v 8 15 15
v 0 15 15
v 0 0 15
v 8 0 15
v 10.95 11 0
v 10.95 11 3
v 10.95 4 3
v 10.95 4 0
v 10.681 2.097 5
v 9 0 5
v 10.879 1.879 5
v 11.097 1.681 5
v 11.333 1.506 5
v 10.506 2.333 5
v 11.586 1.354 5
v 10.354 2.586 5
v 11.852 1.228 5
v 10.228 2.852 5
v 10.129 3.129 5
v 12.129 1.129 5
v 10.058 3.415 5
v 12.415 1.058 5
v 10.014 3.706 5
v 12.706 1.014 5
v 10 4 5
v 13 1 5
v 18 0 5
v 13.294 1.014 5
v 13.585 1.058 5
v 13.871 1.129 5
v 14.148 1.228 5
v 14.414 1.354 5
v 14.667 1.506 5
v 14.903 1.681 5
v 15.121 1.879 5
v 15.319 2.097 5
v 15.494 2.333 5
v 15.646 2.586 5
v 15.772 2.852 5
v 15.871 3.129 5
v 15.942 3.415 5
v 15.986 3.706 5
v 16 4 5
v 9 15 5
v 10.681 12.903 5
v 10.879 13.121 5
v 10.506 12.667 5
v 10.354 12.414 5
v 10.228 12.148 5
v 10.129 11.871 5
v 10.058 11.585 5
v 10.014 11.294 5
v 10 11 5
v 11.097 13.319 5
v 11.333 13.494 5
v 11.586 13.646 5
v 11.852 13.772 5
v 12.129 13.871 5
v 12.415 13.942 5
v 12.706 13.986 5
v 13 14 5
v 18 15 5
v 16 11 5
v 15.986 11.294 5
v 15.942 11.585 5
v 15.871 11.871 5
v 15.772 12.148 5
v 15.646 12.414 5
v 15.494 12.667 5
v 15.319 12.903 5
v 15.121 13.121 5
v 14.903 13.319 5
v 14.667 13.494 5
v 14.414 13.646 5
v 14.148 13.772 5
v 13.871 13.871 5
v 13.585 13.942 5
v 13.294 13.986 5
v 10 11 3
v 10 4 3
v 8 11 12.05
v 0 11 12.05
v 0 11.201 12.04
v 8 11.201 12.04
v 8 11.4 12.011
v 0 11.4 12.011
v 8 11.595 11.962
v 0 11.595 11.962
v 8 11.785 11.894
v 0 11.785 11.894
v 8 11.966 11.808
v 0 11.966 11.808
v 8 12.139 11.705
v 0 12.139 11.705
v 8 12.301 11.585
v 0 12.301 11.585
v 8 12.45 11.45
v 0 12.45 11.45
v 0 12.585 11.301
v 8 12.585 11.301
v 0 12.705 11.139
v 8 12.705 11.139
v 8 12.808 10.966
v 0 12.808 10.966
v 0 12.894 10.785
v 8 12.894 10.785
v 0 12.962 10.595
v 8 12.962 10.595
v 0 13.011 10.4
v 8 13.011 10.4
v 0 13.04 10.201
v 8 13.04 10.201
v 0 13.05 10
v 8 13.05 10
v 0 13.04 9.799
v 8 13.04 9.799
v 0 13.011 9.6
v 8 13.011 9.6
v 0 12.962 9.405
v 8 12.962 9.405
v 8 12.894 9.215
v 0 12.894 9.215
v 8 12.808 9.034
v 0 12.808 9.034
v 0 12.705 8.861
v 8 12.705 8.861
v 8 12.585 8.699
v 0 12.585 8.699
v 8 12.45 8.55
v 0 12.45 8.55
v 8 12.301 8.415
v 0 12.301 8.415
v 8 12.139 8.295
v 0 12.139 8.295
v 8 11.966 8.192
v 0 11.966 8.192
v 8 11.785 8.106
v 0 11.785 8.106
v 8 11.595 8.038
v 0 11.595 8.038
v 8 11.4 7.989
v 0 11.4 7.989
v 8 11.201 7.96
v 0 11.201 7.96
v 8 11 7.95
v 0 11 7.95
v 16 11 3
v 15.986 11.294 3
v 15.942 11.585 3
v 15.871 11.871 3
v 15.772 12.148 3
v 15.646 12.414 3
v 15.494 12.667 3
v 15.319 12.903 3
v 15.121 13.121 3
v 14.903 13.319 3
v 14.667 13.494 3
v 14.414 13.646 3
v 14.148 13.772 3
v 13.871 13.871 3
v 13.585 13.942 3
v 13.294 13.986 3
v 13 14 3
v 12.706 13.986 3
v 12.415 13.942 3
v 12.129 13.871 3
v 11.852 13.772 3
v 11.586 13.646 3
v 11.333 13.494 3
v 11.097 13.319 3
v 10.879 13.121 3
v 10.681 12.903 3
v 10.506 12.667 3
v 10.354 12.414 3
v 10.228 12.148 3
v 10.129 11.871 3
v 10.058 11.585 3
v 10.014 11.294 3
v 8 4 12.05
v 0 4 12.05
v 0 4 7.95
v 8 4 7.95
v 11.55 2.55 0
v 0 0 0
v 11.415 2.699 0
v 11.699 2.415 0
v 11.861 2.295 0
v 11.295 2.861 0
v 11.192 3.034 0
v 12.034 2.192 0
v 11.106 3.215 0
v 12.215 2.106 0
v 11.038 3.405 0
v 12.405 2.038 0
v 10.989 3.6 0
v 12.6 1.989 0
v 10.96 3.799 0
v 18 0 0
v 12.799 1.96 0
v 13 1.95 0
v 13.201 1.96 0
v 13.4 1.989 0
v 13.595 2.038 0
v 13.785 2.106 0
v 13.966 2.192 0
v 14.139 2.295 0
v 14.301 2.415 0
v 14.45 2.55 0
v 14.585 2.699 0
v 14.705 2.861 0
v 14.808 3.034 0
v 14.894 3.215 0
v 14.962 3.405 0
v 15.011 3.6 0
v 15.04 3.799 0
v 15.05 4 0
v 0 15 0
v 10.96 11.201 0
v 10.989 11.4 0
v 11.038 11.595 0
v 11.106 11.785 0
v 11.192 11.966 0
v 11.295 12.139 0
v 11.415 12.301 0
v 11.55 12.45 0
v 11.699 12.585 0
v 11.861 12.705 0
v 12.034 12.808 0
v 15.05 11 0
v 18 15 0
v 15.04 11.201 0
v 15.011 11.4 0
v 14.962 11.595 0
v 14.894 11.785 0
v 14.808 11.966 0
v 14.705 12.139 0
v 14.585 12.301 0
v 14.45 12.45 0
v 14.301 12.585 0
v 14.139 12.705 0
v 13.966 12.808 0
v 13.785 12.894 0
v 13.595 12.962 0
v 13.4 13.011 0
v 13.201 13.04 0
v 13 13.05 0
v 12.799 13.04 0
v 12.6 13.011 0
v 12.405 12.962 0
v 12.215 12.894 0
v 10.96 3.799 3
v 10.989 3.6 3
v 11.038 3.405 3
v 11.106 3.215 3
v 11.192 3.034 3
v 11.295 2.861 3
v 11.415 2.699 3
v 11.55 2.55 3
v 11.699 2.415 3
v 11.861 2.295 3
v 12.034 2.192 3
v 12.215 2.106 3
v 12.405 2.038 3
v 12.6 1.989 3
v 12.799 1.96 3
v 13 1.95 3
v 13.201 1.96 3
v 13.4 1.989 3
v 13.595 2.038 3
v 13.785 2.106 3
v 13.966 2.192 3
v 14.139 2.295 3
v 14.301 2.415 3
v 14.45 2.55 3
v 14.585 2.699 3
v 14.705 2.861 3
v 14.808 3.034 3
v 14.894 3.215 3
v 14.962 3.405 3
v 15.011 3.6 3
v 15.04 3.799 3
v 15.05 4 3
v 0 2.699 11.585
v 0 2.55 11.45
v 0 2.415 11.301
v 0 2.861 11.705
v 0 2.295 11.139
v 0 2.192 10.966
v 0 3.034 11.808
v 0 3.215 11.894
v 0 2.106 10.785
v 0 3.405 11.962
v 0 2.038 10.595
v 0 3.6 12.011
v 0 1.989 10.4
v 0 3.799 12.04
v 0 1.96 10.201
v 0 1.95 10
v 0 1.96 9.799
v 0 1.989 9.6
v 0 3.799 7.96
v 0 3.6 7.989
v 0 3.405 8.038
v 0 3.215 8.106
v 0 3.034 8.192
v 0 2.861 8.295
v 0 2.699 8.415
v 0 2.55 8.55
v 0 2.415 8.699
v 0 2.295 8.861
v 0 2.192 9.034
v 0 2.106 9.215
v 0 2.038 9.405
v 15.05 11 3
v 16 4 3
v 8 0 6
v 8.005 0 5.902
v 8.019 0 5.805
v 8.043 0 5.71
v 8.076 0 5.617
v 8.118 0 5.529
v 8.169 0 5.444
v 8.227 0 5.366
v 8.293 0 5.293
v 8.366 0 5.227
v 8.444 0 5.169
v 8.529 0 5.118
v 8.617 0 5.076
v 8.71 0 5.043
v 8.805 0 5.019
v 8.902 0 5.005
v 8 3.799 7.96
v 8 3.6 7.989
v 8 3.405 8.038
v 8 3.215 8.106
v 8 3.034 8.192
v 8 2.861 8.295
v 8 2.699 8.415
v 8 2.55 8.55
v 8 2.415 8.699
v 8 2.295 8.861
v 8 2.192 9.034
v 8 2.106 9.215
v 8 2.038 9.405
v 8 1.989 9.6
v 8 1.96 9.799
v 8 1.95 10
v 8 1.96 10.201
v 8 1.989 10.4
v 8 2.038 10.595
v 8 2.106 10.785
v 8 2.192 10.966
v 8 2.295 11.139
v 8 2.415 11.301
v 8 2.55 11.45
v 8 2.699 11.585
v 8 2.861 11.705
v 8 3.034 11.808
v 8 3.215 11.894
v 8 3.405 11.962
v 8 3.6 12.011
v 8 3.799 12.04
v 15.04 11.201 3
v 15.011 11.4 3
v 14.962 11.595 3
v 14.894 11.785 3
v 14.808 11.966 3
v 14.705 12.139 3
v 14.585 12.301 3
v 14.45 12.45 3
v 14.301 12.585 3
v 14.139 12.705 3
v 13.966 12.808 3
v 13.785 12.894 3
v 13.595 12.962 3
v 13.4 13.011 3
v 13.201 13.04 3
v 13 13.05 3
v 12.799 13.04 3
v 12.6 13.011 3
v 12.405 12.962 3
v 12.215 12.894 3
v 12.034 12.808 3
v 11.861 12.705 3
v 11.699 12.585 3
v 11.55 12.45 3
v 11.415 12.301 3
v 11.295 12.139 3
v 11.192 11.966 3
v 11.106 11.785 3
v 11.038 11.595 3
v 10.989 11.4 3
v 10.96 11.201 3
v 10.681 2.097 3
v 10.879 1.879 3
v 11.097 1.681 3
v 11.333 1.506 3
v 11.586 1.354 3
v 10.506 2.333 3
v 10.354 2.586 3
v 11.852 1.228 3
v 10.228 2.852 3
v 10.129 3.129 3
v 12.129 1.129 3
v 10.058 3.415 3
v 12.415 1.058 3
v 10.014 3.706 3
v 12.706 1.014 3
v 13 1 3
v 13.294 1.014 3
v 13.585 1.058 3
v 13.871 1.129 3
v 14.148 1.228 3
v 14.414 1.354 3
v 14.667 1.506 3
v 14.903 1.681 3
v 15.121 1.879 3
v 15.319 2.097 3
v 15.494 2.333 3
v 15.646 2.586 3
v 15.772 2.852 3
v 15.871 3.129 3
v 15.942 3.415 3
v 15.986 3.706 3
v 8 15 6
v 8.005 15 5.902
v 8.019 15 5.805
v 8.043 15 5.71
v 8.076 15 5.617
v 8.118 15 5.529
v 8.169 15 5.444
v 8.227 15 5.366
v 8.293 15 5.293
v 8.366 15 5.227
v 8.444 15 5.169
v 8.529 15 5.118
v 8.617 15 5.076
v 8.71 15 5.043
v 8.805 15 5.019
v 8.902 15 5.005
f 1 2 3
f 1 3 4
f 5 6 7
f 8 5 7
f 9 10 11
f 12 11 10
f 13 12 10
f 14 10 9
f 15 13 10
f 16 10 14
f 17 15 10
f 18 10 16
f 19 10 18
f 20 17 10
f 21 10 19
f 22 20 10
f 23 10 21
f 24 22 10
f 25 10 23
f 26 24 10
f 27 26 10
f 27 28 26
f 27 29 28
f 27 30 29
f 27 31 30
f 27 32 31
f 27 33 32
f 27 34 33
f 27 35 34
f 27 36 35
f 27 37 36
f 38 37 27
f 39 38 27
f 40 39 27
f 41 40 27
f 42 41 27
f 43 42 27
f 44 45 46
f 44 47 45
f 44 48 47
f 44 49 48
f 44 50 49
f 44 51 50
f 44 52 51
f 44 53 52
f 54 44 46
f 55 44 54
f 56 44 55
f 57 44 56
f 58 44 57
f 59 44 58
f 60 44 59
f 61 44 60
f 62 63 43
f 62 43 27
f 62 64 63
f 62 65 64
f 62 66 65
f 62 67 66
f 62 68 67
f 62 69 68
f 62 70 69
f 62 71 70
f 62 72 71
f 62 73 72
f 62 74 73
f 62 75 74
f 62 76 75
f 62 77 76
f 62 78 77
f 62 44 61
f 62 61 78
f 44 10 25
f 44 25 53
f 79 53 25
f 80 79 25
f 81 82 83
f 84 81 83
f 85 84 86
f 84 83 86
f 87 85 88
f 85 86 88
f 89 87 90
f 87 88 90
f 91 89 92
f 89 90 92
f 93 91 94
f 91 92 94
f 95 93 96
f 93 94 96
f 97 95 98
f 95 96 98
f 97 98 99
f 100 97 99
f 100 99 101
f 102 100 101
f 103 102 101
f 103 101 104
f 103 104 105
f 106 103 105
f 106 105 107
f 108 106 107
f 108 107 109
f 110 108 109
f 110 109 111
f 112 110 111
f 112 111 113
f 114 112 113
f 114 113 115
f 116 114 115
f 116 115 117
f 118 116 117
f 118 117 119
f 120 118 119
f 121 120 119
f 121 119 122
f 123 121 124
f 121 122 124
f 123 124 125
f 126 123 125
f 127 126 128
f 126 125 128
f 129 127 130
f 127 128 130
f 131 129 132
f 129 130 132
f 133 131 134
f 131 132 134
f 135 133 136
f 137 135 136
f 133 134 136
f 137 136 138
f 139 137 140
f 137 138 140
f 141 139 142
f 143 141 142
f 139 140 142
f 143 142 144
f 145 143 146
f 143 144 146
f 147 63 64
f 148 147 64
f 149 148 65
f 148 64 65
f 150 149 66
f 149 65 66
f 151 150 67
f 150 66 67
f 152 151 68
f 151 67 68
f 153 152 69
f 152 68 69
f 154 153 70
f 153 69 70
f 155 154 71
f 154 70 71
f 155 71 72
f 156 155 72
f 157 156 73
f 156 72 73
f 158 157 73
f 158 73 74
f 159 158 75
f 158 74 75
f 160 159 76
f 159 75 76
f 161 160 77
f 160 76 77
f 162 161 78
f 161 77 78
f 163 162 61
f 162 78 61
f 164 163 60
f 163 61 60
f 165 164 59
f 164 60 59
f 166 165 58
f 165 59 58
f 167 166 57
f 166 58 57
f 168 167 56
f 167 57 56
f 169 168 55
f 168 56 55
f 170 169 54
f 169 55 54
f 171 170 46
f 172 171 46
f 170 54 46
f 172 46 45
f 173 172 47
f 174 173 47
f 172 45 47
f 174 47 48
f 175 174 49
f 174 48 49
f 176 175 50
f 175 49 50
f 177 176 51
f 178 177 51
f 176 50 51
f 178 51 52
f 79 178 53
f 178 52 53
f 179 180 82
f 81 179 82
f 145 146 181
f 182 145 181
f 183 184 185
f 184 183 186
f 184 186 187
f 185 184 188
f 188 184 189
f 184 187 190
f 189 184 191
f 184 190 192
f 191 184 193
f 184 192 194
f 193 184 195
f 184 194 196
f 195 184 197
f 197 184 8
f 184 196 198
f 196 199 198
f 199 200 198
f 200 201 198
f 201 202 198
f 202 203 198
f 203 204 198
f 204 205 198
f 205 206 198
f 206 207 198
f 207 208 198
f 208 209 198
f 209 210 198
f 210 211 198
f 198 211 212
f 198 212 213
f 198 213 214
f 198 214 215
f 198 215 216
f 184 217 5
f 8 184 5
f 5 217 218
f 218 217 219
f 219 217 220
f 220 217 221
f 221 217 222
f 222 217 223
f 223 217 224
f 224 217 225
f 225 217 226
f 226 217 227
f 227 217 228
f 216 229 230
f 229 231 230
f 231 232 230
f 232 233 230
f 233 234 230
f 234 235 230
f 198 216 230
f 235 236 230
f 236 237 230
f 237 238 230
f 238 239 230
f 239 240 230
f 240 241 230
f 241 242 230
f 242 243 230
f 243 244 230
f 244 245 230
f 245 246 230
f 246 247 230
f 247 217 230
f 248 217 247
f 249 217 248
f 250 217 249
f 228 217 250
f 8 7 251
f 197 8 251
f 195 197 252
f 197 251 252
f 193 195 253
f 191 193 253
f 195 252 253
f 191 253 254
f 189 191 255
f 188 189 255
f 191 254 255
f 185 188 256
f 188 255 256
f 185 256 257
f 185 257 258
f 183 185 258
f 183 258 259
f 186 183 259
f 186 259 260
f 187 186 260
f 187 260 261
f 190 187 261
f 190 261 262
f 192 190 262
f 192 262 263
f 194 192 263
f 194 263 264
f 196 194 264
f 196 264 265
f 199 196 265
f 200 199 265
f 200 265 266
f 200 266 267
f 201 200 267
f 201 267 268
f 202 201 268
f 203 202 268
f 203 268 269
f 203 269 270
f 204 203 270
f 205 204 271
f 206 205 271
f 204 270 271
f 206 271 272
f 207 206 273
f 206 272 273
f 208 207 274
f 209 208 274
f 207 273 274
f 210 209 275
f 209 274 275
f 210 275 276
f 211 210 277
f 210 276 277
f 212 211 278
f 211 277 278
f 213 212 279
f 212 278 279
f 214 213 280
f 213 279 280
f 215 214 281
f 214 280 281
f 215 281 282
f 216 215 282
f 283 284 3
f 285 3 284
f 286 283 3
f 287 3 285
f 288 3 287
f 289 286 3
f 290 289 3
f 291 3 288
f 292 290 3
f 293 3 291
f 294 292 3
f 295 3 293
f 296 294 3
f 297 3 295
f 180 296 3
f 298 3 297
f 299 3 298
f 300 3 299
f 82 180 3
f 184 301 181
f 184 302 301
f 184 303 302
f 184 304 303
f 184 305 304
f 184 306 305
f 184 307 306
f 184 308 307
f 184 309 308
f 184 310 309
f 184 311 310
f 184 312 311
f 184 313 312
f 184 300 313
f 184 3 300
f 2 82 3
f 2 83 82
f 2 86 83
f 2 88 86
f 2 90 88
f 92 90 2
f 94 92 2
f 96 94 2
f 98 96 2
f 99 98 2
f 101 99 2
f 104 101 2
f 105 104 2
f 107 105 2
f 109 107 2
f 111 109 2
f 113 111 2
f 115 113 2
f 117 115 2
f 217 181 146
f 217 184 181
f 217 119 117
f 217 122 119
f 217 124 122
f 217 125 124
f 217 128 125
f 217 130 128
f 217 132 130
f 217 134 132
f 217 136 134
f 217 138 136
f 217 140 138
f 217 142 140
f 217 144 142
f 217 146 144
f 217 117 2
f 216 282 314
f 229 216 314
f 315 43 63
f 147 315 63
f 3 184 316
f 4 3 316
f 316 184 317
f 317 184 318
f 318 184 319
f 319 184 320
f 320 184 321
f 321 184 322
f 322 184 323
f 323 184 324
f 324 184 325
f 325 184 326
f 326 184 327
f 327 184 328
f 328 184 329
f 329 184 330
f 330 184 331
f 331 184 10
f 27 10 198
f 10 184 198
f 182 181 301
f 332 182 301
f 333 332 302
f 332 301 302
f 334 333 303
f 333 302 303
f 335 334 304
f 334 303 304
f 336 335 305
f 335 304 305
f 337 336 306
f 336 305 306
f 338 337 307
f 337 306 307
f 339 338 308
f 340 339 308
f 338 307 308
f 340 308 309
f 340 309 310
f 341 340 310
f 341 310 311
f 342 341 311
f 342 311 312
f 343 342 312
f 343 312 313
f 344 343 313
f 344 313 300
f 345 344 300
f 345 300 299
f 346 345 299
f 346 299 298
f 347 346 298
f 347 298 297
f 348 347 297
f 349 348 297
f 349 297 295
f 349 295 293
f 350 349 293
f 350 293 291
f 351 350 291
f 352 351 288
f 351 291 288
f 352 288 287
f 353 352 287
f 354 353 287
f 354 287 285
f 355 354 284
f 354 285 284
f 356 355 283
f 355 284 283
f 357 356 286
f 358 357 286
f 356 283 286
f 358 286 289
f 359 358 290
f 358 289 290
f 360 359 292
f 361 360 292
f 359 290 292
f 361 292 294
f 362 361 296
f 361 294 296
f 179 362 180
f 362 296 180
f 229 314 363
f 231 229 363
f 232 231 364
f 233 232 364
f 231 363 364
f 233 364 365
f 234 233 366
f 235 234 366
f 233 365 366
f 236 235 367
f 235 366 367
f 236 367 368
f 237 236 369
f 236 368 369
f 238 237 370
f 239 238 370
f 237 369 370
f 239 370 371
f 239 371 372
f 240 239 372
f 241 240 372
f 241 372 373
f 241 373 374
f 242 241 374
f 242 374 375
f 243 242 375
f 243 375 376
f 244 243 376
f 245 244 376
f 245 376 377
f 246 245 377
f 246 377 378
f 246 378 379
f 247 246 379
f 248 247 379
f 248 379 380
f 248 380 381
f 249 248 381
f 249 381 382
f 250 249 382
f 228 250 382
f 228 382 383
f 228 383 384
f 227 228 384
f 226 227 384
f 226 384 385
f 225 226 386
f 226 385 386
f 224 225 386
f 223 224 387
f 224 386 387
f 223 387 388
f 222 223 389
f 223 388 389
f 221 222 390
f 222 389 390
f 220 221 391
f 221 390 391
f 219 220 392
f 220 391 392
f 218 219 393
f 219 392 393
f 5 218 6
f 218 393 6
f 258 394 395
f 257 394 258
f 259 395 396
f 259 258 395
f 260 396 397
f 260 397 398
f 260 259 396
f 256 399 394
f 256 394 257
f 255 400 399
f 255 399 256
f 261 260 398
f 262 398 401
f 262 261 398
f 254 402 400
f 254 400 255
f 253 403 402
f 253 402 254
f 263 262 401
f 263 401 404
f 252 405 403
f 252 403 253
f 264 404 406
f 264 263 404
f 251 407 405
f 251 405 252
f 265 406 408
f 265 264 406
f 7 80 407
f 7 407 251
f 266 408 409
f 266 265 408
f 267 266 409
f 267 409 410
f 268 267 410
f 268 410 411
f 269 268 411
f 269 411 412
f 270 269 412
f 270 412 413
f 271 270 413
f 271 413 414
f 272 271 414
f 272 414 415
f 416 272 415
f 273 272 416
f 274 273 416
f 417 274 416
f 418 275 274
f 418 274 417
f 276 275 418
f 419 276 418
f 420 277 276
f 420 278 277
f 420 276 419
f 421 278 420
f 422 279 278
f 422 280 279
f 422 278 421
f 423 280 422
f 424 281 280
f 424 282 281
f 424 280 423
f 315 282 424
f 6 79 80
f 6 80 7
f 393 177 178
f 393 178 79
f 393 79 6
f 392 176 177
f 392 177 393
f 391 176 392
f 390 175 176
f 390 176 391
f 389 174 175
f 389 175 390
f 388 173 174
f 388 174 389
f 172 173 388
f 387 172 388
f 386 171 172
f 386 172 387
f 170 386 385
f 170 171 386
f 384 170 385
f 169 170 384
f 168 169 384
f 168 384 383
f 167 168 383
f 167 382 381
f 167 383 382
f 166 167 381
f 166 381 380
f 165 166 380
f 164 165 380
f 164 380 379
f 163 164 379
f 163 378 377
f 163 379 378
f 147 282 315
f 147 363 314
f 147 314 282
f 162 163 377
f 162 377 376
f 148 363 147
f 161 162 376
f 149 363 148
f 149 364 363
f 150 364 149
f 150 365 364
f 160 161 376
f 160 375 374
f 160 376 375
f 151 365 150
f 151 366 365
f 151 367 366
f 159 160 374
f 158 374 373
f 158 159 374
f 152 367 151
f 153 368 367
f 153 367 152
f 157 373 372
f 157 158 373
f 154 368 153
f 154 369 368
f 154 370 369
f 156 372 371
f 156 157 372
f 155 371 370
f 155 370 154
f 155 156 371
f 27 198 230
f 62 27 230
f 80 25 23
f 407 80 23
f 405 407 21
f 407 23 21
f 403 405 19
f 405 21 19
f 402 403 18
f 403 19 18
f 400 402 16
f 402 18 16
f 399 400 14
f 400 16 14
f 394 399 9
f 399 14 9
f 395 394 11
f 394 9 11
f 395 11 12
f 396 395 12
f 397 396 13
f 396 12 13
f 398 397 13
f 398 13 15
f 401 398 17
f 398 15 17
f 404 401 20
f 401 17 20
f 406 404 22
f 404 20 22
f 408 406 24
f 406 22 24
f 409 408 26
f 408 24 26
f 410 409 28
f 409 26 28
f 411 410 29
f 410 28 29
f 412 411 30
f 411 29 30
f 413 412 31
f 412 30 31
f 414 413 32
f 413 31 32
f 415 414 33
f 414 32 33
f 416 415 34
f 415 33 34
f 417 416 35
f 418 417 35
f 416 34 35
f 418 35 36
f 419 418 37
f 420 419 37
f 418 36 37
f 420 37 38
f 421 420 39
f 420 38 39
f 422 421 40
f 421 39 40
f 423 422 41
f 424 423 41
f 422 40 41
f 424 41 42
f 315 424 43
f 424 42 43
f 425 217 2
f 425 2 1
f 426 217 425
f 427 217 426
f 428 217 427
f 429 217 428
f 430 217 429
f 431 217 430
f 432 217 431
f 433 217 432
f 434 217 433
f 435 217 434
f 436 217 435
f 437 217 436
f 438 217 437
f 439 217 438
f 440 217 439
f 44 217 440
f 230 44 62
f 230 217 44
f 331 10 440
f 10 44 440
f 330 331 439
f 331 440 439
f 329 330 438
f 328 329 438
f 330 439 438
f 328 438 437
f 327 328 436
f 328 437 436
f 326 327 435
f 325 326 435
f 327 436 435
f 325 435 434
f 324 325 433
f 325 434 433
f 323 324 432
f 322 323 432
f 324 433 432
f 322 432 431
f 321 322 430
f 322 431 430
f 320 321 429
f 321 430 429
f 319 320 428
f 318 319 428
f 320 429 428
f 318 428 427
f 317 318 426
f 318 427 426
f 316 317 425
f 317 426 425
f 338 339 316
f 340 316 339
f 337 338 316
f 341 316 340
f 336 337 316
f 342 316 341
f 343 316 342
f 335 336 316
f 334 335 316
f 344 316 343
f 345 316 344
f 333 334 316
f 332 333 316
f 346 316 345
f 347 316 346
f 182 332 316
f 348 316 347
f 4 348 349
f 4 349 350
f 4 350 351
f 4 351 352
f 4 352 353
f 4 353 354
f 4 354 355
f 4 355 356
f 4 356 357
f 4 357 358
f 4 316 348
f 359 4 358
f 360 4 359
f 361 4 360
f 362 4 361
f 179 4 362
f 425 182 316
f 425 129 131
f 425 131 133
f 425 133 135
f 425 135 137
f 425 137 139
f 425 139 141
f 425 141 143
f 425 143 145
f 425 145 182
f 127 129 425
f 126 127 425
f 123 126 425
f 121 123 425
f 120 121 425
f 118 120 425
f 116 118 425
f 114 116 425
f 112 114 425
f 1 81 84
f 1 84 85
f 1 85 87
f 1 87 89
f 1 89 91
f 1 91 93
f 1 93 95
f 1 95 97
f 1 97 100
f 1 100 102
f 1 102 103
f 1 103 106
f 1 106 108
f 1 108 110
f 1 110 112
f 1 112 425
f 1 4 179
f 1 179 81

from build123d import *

# Parameters (mm, degrees)
F0_W     = 18
F0_H     = 15
F1_DEPTH = 15
F3_DEPTH = 25
F4_W     = 10
F4_H     = 15
F5_DEPTH = 10
F7_DEPTH = 25
F9_DEPTH = 2
F10_R    = 1


with BuildPart() as f1:
    # F0 (on Top) → F1 (new body)
    with BuildSketch(Plane.XY):
        with Locations((9, 7.5)):
            Rectangle(F0_W, F0_H)
    extrude(amount=F1_DEPTH)

    # F2 (on face) → F3 (cut)
    with BuildSketch(Plane(origin=(0, 0, 0), x_dir=(0, -1, 0), z_dir=(-1, 0, 0))):
        with BuildLine():
            Line((-11, 7.95), (-4, 7.95))
            ThreePointArc((-4, 7.95), (-1.95, 10), (-4, 12.05))
            Line((-4, 12.05), (-11, 12.05))
            ThreePointArc((-11, 12.05), (-13.05, 10), (-11, 7.95))
        make_face()
    extrude(amount=-F3_DEPTH, mode=Mode.SUBTRACT)

    # F4 (on face) → F5 (cut)
    with BuildSketch(Plane.XY.offset(15)):
        with Locations((13, 7.5)):
            Rectangle(F4_W, F4_H)
    extrude(amount=-F5_DEPTH, mode=Mode.SUBTRACT)

    # F6 (on face) → F7 (cut)
    with BuildSketch(Plane.XY.offset(5)):
        with BuildLine():
            Line((15.05, 4), (15.05, 11))
            ThreePointArc((15.05, 11), (13, 13.05), (10.95, 11))
            Line((10.95, 11), (10.95, 4))
            ThreePointArc((10.95, 4), (13, 1.95), (15.05, 4))
        make_face()
    extrude(amount=-F7_DEPTH, mode=Mode.SUBTRACT)

    # F8 (on face) → F9 (cut)
    with BuildSketch(Plane.XY.offset(5)):
        with BuildLine():
            Line((16, 4), (16, 11))
            ThreePointArc((16, 11), (13, 14), (10, 11))
            Line((10, 11), (10, 4))
            ThreePointArc((10, 4), (13, 1), (16, 4))
        make_face()
    extrude(amount=-F9_DEPTH, mode=Mode.SUBTRACT)

    # F10
    f10_edges = [f1.edges().sort_by_distance(p)[0] for p in [
        (8, 7.5, 5),
    ]]
    fillet(f10_edges, radius=F10_R)


solid = f1.part
